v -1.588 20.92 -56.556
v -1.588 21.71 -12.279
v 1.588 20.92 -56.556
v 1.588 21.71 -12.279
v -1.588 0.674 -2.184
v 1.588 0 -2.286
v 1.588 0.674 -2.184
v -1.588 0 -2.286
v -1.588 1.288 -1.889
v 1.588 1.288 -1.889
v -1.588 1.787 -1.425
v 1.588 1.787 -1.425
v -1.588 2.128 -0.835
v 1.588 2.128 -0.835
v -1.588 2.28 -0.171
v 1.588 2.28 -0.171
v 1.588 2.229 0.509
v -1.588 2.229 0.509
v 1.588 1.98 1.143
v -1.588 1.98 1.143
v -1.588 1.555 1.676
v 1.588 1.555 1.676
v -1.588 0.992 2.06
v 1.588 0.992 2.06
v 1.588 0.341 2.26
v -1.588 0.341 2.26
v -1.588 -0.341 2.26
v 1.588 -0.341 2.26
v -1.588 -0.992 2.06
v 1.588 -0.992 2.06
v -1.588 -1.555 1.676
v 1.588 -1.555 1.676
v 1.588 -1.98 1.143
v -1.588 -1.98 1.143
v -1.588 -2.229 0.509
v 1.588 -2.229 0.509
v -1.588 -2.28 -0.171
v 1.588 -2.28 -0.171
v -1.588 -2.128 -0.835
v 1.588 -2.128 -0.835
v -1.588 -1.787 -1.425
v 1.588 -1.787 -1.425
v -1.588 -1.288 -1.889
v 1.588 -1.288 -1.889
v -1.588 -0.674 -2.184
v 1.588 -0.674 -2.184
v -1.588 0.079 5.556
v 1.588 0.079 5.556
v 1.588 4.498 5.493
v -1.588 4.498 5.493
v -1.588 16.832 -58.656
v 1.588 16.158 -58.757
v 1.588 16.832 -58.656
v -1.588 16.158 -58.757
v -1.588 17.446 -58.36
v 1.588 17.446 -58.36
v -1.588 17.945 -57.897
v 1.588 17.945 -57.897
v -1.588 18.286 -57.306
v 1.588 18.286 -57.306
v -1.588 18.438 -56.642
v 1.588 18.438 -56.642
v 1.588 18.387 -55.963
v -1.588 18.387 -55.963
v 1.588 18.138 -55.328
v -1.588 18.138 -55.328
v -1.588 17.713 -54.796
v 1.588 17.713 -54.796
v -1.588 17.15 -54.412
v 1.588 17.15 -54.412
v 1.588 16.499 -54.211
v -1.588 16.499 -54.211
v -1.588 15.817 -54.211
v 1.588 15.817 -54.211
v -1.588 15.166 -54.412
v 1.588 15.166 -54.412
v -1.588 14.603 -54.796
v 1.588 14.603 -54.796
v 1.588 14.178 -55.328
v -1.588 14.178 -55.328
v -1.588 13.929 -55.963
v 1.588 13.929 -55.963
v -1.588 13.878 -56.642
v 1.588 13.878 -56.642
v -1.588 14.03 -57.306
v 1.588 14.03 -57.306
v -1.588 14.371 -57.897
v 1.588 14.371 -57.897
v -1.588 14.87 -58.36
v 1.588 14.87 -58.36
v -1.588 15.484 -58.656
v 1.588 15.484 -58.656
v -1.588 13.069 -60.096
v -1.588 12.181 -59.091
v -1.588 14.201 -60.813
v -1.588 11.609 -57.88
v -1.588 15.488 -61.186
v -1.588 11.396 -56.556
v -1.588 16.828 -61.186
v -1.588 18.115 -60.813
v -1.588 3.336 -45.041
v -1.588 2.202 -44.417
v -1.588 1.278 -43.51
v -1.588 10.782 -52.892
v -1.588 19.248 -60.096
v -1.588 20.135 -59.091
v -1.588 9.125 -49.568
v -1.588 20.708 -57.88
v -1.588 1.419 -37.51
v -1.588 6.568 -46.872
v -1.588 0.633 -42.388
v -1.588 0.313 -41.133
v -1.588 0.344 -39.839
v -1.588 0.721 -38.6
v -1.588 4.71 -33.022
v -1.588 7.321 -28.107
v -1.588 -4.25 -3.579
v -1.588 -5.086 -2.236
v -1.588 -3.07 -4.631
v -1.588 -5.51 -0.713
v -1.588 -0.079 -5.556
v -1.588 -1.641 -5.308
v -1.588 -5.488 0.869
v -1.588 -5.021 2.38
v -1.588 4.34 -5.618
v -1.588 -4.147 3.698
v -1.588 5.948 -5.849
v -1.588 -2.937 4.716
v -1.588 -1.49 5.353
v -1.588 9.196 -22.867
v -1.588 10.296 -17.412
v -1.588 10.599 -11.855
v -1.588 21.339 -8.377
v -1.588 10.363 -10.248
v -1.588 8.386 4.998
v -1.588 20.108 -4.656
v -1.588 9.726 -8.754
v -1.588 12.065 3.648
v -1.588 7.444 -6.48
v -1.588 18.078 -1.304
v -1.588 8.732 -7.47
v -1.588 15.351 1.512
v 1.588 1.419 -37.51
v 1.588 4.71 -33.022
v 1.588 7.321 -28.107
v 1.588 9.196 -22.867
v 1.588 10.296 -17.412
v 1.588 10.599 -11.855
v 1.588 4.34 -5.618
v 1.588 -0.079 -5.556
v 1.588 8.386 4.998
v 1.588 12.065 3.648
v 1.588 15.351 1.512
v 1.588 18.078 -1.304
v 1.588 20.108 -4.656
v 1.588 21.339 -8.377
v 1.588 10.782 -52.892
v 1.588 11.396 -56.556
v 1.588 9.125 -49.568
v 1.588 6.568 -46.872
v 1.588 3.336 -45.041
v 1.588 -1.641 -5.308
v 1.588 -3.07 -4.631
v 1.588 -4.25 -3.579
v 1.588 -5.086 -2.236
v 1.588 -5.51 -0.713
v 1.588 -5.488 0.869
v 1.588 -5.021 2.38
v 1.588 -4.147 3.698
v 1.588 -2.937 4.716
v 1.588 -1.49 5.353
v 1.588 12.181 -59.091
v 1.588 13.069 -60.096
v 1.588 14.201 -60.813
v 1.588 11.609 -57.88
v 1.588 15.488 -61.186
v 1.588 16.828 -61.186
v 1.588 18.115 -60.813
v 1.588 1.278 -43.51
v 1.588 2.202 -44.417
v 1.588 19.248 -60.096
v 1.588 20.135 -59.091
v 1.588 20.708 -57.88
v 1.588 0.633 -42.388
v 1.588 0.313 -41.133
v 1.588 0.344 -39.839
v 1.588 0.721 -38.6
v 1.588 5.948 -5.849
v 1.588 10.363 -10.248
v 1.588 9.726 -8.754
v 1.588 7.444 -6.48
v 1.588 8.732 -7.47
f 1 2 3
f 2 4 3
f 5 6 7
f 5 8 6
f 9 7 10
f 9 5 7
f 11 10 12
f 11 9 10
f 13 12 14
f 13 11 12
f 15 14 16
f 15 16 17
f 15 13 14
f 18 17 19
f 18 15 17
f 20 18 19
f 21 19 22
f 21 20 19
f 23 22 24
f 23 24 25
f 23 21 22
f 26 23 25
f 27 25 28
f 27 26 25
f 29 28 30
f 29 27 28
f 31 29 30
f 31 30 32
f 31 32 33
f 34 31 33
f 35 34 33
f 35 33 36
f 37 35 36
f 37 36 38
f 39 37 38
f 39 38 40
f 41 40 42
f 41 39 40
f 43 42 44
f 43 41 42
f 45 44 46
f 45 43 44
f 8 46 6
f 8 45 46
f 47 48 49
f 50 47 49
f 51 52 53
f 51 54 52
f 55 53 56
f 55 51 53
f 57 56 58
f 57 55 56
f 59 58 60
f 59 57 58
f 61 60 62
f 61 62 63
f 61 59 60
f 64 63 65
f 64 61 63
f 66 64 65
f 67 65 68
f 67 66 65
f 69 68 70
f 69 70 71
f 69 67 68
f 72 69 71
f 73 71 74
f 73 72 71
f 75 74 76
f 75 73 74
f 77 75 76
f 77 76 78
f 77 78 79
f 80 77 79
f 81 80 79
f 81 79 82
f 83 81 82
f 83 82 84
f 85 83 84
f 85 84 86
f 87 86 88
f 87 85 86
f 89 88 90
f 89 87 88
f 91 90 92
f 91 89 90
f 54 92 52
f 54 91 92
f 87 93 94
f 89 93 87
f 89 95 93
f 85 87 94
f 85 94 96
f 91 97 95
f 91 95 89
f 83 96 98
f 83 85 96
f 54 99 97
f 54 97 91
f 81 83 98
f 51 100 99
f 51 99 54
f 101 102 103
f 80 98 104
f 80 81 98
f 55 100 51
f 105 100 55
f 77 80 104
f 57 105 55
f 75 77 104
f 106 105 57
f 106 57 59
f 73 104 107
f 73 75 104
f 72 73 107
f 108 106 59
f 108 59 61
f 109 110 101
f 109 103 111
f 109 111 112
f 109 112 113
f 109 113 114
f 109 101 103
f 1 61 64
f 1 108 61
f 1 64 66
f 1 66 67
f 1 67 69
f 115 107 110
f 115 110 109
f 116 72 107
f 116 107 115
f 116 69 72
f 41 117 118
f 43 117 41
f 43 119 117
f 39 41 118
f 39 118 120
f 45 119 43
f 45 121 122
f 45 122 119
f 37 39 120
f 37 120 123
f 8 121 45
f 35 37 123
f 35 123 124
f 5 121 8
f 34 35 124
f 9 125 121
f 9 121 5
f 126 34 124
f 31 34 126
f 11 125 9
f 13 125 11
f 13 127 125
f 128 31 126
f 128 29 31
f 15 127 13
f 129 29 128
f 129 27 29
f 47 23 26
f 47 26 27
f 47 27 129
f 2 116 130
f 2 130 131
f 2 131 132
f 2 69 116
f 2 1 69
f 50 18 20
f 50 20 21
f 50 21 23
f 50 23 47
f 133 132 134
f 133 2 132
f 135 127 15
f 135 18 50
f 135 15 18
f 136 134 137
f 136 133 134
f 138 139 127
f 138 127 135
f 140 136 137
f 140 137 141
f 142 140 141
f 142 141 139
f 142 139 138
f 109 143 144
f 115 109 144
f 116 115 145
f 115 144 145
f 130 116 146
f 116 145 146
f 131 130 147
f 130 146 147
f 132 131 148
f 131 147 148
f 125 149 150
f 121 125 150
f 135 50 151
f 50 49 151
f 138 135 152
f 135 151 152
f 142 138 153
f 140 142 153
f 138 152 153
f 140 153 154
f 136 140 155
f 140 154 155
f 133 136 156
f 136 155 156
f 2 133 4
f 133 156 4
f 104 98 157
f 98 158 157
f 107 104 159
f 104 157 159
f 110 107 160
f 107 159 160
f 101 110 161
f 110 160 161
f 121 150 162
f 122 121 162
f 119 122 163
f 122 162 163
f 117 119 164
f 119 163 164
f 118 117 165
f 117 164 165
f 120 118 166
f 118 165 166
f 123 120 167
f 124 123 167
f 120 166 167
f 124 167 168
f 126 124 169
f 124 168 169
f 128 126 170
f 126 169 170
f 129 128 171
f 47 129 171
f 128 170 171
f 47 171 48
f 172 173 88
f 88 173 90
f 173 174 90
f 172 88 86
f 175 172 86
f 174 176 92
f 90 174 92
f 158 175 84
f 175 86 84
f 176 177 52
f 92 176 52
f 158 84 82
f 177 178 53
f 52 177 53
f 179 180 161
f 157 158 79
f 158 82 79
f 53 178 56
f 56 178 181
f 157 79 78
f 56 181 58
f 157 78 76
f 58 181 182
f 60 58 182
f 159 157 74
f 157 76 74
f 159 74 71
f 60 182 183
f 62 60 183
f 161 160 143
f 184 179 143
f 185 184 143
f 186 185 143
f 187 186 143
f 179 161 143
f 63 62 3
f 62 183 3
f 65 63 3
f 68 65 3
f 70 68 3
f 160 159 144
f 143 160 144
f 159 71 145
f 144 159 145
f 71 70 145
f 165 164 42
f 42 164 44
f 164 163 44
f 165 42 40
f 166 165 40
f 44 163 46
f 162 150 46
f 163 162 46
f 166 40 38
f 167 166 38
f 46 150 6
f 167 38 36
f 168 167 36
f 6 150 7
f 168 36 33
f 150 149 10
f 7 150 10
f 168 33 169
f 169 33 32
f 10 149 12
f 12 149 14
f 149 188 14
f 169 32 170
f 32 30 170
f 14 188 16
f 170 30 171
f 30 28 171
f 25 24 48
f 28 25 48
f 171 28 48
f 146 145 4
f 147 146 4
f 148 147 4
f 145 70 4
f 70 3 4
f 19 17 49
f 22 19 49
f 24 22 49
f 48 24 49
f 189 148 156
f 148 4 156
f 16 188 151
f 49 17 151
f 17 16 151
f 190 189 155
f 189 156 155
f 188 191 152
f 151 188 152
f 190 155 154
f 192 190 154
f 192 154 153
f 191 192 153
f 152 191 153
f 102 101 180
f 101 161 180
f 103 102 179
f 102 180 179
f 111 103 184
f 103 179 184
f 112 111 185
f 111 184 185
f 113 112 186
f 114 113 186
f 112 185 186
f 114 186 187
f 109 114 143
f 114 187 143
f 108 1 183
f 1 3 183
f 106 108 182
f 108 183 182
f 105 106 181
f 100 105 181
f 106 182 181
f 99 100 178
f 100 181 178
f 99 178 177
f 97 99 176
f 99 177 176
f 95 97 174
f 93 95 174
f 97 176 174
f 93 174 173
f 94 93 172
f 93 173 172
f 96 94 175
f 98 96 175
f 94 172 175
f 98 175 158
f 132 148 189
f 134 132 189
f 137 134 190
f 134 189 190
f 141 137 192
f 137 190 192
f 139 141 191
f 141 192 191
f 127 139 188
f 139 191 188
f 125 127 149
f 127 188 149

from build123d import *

# Parameters (mm, degrees)
SKETCH1_R           = 2.286
BOSS_EXTRUDE1_DEPTH = 1.5875


with BuildPart() as part:
    # Sketch1 → Boss-Extrude1 (new, symmetric)
    with BuildSketch(Plane(origin=(0, 0, 0), x_dir=(0, 0, -1), z_dir=(1, 0, 0))):
        with BuildLine():
            Line((-5.555690027, 0.078882129), (-5.492947583, 4.497849692))
            ThreePointArc((-5.492947583, 4.497849692), (-0.180708129, 16.793970412), (12.279247772, 21.709656704))
            Line((12.279247772, 21.709656704), (56.556266052, 20.919821075))
            ThreePointArc((56.556266052, 20.919821075), (61.233823705, 16.158078636), (56.556266052, 11.396336198))
            ThreePointArc((56.556266052, 11.396336198), (49.56780942, 9.124706187), (45.041369891, 3.335908885))
            ThreePointArc((45.041369891, 3.335908885), (41.771149469, 0.430257339), (37.509684519, 1.418725347))
            ThreePointArc((37.509684519, 1.418725347), (25.520855431, 8.352797068), (11.854536038, 10.598924348))
            ThreePointArc((11.854536038, 10.598924348), (7.469501812, 8.731884997), (5.61843247, 4.340085435))
            Line((5.61843247, 4.340085435), (5.555690027, -0.078882129))
            ThreePointArc((5.555690027, -0.078882129), (-0.078882129, -5.555690027), (-5.555690027, 0.078882129))
        make_face()
        Circle(SKETCH1_R, mode=Mode.SUBTRACT)
        with Locations((56.471323705, 16.158078636)):
            Circle(SKETCH1_R, mode=Mode.SUBTRACT)
    extrude(amount=BOSS_EXTRUDE1_DEPTH, both=True)


solid = part.part
